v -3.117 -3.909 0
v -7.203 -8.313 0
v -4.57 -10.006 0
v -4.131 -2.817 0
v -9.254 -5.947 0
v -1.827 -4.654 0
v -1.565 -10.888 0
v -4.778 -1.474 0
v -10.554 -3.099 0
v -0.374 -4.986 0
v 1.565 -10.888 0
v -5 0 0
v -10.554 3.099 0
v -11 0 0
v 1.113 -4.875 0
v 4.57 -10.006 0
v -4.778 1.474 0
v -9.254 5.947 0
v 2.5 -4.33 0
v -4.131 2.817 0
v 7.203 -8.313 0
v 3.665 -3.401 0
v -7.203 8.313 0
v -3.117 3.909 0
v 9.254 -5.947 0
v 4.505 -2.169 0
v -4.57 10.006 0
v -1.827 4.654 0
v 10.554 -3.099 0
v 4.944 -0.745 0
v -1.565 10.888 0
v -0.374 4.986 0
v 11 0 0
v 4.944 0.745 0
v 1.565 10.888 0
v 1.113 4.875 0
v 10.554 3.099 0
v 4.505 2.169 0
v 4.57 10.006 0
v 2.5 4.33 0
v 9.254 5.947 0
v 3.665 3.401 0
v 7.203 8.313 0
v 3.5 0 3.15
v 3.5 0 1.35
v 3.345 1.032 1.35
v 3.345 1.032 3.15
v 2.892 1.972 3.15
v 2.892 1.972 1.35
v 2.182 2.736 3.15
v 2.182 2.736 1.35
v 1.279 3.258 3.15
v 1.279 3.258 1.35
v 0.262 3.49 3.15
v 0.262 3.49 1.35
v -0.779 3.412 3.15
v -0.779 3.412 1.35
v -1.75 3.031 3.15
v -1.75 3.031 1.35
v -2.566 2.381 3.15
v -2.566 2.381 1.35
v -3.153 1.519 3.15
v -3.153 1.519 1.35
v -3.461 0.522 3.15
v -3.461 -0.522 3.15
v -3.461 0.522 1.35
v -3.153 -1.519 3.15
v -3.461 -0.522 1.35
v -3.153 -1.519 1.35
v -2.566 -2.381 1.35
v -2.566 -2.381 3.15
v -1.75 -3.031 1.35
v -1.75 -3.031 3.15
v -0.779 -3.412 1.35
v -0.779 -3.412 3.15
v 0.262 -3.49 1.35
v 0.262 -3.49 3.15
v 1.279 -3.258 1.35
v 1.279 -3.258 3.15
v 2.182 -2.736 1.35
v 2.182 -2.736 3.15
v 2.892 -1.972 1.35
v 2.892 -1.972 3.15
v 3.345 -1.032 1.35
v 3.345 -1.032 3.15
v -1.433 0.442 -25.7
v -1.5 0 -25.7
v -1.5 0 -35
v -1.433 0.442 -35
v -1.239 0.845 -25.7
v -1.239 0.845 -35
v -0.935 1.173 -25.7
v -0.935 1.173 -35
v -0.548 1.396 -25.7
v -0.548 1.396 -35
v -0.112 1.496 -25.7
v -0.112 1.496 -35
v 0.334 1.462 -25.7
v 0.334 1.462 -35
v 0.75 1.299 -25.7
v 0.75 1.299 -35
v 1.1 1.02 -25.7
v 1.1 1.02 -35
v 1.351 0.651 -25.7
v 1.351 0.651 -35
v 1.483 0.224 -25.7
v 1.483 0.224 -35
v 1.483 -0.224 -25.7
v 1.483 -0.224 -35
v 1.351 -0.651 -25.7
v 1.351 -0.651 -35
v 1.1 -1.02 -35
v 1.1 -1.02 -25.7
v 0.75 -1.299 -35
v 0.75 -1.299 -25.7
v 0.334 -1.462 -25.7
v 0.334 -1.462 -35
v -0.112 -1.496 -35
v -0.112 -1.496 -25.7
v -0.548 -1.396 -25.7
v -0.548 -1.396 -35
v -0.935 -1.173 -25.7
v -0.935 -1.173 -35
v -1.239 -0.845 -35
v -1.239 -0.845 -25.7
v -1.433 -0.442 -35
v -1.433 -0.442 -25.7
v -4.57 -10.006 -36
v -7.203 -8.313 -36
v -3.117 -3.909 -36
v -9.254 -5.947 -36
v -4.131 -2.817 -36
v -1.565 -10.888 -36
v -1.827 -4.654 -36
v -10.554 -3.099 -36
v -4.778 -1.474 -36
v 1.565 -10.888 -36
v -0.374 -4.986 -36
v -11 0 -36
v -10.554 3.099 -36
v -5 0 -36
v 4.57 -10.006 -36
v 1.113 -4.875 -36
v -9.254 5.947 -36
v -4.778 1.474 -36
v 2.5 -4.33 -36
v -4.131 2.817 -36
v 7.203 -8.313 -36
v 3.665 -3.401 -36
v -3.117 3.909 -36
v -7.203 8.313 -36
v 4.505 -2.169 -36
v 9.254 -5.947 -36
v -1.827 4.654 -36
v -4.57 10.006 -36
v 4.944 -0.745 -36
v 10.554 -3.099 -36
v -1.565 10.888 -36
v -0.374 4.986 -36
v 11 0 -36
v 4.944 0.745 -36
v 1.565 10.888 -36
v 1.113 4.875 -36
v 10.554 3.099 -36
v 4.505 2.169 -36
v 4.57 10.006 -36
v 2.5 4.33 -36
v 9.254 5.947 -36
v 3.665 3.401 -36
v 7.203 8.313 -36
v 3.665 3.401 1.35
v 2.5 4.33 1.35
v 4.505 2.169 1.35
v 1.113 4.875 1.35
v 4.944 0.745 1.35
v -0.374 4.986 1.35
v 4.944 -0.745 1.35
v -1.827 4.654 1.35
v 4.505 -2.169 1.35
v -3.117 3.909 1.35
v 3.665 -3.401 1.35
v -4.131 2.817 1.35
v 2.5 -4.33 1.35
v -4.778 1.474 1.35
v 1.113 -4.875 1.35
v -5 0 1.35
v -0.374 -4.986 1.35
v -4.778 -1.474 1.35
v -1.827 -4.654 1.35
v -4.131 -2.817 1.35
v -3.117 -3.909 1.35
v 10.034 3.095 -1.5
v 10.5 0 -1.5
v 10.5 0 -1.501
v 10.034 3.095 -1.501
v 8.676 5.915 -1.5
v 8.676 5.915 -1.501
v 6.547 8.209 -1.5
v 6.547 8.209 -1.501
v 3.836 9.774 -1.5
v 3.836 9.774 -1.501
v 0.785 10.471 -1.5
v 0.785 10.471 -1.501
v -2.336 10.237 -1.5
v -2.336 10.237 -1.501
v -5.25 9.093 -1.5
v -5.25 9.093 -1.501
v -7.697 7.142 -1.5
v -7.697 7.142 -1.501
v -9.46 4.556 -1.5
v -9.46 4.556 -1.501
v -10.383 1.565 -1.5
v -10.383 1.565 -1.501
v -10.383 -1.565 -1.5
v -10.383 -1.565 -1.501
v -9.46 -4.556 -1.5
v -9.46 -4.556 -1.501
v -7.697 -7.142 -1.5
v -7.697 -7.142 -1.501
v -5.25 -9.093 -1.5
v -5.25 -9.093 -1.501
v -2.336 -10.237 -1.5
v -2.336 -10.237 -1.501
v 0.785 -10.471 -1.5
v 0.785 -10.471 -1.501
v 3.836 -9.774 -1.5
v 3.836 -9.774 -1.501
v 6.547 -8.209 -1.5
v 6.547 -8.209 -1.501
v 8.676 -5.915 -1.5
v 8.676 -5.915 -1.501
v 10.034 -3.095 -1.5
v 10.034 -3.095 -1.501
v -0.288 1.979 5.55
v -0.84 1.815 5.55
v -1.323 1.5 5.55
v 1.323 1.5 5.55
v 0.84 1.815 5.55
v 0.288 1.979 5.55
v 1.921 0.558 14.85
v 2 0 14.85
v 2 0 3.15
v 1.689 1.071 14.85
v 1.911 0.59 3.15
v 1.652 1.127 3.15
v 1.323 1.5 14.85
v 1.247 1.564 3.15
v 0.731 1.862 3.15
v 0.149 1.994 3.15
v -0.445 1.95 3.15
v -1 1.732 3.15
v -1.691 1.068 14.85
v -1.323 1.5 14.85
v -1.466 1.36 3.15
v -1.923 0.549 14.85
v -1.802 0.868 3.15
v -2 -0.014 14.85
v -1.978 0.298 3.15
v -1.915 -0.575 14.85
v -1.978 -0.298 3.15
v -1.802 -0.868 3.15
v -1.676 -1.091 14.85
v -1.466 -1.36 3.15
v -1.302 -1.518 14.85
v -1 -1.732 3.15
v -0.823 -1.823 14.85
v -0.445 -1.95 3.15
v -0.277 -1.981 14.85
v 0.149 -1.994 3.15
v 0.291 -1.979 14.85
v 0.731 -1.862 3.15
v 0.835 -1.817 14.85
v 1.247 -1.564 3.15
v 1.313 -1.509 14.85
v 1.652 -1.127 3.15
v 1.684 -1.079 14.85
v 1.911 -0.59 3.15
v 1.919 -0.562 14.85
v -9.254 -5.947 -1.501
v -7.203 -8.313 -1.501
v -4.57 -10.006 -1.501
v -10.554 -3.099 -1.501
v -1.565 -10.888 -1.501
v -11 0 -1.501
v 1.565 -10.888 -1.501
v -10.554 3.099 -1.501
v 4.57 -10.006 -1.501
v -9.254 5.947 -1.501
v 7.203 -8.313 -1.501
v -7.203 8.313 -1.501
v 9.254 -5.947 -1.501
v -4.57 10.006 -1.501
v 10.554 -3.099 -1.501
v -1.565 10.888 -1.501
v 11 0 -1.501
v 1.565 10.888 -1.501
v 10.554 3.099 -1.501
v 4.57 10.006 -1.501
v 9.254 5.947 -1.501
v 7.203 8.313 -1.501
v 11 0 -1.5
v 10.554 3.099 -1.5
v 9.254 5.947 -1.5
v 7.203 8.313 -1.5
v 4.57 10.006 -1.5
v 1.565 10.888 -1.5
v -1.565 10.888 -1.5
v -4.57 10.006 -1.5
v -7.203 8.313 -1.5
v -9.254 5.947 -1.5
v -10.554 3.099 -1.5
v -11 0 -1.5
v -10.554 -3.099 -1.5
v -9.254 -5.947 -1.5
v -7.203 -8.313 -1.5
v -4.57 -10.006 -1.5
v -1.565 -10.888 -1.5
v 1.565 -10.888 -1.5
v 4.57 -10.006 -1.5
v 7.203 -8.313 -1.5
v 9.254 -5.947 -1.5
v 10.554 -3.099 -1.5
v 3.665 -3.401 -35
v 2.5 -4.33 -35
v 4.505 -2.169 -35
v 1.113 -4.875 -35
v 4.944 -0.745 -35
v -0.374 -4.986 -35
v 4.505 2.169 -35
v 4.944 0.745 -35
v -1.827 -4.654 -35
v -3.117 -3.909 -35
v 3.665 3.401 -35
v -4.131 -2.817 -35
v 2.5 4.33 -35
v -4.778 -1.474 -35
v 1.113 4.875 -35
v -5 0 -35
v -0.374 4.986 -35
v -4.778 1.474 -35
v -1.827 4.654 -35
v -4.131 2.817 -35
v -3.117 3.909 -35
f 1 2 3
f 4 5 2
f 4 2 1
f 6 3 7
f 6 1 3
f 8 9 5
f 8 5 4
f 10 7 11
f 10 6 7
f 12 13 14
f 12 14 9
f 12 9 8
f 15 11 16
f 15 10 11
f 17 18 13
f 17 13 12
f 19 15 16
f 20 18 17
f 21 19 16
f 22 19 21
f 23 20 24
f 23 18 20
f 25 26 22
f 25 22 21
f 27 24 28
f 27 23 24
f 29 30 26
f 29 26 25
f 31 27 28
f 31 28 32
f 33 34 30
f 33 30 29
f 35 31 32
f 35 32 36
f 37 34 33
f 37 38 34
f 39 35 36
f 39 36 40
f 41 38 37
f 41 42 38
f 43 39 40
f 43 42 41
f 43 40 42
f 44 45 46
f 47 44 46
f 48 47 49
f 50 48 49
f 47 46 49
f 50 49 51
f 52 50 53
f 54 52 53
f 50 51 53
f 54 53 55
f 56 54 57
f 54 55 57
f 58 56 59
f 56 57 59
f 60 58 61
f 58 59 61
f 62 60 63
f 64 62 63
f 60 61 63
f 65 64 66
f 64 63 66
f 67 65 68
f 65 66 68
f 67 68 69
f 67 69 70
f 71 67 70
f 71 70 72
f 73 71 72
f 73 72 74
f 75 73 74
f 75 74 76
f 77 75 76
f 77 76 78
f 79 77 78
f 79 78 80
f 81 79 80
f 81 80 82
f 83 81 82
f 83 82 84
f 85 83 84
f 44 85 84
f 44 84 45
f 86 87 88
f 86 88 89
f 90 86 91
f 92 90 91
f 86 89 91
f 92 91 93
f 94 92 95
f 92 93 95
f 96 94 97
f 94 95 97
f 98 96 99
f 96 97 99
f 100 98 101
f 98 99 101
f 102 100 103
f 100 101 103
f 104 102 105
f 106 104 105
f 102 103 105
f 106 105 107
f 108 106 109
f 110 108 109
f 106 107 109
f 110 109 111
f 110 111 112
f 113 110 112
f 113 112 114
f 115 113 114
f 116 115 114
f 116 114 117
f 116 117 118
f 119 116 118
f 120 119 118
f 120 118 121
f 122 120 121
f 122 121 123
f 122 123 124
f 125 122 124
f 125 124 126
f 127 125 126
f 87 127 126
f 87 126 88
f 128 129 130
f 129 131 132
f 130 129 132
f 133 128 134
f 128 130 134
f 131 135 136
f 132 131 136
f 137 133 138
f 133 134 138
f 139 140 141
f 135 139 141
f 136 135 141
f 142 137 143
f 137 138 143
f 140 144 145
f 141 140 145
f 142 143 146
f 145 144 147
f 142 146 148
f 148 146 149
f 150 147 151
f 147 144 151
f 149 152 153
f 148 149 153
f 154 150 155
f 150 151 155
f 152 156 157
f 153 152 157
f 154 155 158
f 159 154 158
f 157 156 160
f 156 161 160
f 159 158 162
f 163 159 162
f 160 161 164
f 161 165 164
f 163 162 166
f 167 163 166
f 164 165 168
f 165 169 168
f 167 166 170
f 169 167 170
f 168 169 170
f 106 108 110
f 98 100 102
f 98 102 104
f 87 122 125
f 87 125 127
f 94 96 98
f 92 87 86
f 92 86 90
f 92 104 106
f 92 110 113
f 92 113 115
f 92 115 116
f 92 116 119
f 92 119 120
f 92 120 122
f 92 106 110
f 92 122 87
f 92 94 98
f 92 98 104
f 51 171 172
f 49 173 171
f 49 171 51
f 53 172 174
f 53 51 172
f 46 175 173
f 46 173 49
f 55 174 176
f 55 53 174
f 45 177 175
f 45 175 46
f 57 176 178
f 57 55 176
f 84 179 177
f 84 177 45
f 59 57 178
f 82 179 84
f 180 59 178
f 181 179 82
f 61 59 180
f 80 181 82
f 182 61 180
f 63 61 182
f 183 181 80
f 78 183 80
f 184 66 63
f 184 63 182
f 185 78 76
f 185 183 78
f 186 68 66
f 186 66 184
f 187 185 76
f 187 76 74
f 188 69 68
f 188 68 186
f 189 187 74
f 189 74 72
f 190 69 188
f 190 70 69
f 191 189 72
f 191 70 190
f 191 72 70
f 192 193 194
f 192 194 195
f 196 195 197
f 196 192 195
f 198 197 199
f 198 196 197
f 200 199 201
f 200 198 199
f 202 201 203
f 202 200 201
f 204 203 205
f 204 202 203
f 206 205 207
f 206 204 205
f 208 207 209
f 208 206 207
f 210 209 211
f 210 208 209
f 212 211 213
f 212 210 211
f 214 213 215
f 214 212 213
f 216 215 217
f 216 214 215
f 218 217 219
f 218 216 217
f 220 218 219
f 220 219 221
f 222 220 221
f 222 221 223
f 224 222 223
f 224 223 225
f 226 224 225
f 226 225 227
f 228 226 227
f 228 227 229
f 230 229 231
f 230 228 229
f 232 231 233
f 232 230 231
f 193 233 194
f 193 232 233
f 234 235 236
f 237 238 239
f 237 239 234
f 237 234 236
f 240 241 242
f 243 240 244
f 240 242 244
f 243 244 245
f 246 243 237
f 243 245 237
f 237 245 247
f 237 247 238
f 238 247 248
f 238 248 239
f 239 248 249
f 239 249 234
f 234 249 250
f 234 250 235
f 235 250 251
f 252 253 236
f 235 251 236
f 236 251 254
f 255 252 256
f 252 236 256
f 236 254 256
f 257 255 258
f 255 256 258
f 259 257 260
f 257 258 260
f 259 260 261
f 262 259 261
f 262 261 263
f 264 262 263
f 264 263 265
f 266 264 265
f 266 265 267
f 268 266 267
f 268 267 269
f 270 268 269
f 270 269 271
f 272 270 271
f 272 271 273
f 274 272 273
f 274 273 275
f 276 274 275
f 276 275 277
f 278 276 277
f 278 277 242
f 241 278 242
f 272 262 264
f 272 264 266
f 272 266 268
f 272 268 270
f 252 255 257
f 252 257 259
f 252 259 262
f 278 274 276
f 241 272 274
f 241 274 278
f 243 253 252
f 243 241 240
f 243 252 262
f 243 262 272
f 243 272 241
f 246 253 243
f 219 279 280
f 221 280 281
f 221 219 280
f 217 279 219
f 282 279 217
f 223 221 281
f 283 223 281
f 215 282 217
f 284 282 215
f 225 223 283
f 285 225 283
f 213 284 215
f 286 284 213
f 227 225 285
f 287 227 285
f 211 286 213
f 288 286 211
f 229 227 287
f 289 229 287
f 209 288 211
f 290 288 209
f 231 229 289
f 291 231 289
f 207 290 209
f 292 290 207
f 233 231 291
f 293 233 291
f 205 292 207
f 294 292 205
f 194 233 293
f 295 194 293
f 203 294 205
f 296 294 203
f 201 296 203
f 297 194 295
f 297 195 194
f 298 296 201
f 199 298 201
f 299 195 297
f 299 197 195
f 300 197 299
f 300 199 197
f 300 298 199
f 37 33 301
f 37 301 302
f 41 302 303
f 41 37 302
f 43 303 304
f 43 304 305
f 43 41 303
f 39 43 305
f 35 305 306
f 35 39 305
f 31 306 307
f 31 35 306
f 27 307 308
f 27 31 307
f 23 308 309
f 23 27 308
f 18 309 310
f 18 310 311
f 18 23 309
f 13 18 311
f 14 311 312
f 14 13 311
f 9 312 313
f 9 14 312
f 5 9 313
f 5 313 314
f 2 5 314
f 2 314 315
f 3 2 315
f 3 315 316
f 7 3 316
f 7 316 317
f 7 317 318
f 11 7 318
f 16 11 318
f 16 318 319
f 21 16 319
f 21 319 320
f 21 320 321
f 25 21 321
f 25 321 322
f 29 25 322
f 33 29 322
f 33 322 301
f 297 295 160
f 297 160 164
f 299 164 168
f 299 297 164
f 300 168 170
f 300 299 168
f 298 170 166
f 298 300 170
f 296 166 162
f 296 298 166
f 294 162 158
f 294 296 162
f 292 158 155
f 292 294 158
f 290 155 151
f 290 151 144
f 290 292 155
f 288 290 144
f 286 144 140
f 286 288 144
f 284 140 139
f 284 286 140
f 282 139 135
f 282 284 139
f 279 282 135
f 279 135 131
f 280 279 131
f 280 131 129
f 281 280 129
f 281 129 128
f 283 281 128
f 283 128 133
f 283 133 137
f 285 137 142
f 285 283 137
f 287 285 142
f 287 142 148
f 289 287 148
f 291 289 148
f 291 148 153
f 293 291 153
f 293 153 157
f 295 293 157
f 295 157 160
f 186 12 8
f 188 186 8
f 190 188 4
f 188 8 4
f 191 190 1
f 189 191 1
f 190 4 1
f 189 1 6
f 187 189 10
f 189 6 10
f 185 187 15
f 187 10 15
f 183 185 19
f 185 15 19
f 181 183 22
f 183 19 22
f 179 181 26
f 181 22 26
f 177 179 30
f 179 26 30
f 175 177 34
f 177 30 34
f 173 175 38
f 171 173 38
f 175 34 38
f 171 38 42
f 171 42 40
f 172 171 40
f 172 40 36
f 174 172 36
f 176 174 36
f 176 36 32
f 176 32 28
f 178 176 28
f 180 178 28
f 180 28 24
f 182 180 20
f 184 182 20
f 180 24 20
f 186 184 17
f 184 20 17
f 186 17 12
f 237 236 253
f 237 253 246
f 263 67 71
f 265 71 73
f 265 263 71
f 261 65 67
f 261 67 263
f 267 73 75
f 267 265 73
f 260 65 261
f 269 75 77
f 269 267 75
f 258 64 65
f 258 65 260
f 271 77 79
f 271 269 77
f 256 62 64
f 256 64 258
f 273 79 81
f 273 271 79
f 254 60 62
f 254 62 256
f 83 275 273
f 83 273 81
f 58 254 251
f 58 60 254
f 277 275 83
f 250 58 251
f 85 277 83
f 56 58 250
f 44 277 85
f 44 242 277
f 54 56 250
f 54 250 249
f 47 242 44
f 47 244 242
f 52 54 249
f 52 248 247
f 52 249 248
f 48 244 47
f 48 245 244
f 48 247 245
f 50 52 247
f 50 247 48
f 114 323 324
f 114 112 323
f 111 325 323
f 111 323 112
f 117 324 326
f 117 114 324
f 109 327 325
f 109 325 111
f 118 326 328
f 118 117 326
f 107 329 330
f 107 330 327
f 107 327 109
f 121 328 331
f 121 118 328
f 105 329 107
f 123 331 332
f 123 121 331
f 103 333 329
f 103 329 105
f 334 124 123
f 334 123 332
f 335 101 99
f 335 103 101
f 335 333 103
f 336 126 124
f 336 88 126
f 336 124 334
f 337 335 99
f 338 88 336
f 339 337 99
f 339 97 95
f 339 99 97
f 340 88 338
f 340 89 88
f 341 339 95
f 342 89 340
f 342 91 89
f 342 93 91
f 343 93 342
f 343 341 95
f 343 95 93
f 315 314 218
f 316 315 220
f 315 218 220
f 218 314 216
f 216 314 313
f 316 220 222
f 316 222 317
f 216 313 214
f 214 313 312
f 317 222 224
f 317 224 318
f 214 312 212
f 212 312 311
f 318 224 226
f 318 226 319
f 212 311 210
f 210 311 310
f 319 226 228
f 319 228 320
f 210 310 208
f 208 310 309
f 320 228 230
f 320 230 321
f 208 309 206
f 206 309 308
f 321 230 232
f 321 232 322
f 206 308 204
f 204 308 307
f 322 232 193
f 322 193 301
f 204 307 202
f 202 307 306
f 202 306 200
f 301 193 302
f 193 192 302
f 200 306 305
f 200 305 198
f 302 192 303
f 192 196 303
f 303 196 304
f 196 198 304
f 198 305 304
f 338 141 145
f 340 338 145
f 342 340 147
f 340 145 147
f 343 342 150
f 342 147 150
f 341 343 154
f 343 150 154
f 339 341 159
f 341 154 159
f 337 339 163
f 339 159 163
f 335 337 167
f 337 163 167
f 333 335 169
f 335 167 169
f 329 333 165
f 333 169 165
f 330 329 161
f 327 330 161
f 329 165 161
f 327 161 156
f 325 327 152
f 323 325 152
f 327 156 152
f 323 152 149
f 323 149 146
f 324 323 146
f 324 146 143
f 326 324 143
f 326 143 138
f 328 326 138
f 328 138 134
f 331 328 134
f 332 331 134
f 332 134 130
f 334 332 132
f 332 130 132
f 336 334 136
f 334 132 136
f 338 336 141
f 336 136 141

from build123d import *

# Parameters (mm, degrees)
SKETCH1_R                     = 11
BODY_DEPTH                    = 36
SKETCH1_3_R                   = 5
SKETCH1_3_R_2                 = 3.5
COLLAR_1_DEPTH                = 1.35
SKETCH1_4_R                   = 3.5
SKETCH1_4_R_2                 = 2
COLLAR_2_DEPTH                = 3.15
CAP_START                     = -1.5
SKETCH4_R                     = 11
SKETCH4_R_2                   = 10.5
CAP_RING_DEPTH                = 0.001
SKETCH1_5_R                   = 2
SHAFT_DEPTH                   = 14.85
KEY_START                     = -9.3
KEY_WAY_DEPTH                 = 9.3
SKETCH2_R                     = 5
SKETCH2_R_2                   = 1.5
RECESS_FOR_MOTOR_COLLAR_DEPTH = 1
SKETCH2_2_R                   = 1.5
RECESS_FOR_MOTOR_SHAFT_DEPTH  = 10.3


with BuildPart() as part:
    # Sketch1 → Body (new body)
    with BuildSketch(Plane.XY):
        Circle(SKETCH1_R)
    extrude(amount=-BODY_DEPTH)

    # Sketch1<3> → Collar 1 (add)
    with BuildSketch(Plane.XY):
        Circle(SKETCH1_3_R)
        Circle(SKETCH1_3_R_2, mode=Mode.SUBTRACT)
    extrude(amount=COLLAR_1_DEPTH)

    # Sketch1<4> → Collar 2 (add)
    with BuildSketch(Plane.XY):
        Circle(SKETCH1_4_R)
        Circle(SKETCH1_4_R_2, mode=Mode.SUBTRACT)
    extrude(amount=COLLAR_2_DEPTH)

    # Sketch4 → Cap Ring (cut)
    with BuildSketch(Plane.XY.offset(CAP_START)):
        Circle(SKETCH4_R)
        Circle(SKETCH4_R_2, mode=Mode.SUBTRACT)
    extrude(amount=-CAP_RING_DEPTH, mode=Mode.SUBTRACT)

    # Sketch1<5> → Shaft (add)
    with BuildSketch(Plane.XY):
        Circle(SKETCH1_5_R)
    extrude(amount=SHAFT_DEPTH)

    # Sketch3 → Key Way (cut)
    with BuildSketch(Plane.XY.offset(14.85).offset(KEY_START)):
        with BuildLine():
            Line((-1.322875656, 1.5), (0, 1.5))
            Line((0, 1.5), (1.322875656, 1.5))
            ThreePointArc((1.322875656, 1.5), (0, 2), (-1.322875656, 1.5))
        make_face()
    extrude(amount=KEY_WAY_DEPTH, mode=Mode.SUBTRACT)

    # Sketch2 → Recess for Motor Collar (cut)
    with BuildSketch(Plane(origin=(0, 0, -36), x_dir=(-1, 0, 0), z_dir=(0, 0, -1))):
        Circle(SKETCH2_R)
        Circle(SKETCH2_R_2, mode=Mode.SUBTRACT)
    extrude(amount=-RECESS_FOR_MOTOR_COLLAR_DEPTH, mode=Mode.SUBTRACT)

    # Sketch2<2> → Recess for Motor Shaft (cut)
    with BuildSketch(Plane(origin=(0, 0, -36), x_dir=(-1, 0, 0), z_dir=(0, 0, -1))):
        Circle(SKETCH2_2_R)
    extrude(amount=-RECESS_FOR_MOTOR_SHAFT_DEPTH, mode=Mode.SUBTRACT)


solid = part.part
